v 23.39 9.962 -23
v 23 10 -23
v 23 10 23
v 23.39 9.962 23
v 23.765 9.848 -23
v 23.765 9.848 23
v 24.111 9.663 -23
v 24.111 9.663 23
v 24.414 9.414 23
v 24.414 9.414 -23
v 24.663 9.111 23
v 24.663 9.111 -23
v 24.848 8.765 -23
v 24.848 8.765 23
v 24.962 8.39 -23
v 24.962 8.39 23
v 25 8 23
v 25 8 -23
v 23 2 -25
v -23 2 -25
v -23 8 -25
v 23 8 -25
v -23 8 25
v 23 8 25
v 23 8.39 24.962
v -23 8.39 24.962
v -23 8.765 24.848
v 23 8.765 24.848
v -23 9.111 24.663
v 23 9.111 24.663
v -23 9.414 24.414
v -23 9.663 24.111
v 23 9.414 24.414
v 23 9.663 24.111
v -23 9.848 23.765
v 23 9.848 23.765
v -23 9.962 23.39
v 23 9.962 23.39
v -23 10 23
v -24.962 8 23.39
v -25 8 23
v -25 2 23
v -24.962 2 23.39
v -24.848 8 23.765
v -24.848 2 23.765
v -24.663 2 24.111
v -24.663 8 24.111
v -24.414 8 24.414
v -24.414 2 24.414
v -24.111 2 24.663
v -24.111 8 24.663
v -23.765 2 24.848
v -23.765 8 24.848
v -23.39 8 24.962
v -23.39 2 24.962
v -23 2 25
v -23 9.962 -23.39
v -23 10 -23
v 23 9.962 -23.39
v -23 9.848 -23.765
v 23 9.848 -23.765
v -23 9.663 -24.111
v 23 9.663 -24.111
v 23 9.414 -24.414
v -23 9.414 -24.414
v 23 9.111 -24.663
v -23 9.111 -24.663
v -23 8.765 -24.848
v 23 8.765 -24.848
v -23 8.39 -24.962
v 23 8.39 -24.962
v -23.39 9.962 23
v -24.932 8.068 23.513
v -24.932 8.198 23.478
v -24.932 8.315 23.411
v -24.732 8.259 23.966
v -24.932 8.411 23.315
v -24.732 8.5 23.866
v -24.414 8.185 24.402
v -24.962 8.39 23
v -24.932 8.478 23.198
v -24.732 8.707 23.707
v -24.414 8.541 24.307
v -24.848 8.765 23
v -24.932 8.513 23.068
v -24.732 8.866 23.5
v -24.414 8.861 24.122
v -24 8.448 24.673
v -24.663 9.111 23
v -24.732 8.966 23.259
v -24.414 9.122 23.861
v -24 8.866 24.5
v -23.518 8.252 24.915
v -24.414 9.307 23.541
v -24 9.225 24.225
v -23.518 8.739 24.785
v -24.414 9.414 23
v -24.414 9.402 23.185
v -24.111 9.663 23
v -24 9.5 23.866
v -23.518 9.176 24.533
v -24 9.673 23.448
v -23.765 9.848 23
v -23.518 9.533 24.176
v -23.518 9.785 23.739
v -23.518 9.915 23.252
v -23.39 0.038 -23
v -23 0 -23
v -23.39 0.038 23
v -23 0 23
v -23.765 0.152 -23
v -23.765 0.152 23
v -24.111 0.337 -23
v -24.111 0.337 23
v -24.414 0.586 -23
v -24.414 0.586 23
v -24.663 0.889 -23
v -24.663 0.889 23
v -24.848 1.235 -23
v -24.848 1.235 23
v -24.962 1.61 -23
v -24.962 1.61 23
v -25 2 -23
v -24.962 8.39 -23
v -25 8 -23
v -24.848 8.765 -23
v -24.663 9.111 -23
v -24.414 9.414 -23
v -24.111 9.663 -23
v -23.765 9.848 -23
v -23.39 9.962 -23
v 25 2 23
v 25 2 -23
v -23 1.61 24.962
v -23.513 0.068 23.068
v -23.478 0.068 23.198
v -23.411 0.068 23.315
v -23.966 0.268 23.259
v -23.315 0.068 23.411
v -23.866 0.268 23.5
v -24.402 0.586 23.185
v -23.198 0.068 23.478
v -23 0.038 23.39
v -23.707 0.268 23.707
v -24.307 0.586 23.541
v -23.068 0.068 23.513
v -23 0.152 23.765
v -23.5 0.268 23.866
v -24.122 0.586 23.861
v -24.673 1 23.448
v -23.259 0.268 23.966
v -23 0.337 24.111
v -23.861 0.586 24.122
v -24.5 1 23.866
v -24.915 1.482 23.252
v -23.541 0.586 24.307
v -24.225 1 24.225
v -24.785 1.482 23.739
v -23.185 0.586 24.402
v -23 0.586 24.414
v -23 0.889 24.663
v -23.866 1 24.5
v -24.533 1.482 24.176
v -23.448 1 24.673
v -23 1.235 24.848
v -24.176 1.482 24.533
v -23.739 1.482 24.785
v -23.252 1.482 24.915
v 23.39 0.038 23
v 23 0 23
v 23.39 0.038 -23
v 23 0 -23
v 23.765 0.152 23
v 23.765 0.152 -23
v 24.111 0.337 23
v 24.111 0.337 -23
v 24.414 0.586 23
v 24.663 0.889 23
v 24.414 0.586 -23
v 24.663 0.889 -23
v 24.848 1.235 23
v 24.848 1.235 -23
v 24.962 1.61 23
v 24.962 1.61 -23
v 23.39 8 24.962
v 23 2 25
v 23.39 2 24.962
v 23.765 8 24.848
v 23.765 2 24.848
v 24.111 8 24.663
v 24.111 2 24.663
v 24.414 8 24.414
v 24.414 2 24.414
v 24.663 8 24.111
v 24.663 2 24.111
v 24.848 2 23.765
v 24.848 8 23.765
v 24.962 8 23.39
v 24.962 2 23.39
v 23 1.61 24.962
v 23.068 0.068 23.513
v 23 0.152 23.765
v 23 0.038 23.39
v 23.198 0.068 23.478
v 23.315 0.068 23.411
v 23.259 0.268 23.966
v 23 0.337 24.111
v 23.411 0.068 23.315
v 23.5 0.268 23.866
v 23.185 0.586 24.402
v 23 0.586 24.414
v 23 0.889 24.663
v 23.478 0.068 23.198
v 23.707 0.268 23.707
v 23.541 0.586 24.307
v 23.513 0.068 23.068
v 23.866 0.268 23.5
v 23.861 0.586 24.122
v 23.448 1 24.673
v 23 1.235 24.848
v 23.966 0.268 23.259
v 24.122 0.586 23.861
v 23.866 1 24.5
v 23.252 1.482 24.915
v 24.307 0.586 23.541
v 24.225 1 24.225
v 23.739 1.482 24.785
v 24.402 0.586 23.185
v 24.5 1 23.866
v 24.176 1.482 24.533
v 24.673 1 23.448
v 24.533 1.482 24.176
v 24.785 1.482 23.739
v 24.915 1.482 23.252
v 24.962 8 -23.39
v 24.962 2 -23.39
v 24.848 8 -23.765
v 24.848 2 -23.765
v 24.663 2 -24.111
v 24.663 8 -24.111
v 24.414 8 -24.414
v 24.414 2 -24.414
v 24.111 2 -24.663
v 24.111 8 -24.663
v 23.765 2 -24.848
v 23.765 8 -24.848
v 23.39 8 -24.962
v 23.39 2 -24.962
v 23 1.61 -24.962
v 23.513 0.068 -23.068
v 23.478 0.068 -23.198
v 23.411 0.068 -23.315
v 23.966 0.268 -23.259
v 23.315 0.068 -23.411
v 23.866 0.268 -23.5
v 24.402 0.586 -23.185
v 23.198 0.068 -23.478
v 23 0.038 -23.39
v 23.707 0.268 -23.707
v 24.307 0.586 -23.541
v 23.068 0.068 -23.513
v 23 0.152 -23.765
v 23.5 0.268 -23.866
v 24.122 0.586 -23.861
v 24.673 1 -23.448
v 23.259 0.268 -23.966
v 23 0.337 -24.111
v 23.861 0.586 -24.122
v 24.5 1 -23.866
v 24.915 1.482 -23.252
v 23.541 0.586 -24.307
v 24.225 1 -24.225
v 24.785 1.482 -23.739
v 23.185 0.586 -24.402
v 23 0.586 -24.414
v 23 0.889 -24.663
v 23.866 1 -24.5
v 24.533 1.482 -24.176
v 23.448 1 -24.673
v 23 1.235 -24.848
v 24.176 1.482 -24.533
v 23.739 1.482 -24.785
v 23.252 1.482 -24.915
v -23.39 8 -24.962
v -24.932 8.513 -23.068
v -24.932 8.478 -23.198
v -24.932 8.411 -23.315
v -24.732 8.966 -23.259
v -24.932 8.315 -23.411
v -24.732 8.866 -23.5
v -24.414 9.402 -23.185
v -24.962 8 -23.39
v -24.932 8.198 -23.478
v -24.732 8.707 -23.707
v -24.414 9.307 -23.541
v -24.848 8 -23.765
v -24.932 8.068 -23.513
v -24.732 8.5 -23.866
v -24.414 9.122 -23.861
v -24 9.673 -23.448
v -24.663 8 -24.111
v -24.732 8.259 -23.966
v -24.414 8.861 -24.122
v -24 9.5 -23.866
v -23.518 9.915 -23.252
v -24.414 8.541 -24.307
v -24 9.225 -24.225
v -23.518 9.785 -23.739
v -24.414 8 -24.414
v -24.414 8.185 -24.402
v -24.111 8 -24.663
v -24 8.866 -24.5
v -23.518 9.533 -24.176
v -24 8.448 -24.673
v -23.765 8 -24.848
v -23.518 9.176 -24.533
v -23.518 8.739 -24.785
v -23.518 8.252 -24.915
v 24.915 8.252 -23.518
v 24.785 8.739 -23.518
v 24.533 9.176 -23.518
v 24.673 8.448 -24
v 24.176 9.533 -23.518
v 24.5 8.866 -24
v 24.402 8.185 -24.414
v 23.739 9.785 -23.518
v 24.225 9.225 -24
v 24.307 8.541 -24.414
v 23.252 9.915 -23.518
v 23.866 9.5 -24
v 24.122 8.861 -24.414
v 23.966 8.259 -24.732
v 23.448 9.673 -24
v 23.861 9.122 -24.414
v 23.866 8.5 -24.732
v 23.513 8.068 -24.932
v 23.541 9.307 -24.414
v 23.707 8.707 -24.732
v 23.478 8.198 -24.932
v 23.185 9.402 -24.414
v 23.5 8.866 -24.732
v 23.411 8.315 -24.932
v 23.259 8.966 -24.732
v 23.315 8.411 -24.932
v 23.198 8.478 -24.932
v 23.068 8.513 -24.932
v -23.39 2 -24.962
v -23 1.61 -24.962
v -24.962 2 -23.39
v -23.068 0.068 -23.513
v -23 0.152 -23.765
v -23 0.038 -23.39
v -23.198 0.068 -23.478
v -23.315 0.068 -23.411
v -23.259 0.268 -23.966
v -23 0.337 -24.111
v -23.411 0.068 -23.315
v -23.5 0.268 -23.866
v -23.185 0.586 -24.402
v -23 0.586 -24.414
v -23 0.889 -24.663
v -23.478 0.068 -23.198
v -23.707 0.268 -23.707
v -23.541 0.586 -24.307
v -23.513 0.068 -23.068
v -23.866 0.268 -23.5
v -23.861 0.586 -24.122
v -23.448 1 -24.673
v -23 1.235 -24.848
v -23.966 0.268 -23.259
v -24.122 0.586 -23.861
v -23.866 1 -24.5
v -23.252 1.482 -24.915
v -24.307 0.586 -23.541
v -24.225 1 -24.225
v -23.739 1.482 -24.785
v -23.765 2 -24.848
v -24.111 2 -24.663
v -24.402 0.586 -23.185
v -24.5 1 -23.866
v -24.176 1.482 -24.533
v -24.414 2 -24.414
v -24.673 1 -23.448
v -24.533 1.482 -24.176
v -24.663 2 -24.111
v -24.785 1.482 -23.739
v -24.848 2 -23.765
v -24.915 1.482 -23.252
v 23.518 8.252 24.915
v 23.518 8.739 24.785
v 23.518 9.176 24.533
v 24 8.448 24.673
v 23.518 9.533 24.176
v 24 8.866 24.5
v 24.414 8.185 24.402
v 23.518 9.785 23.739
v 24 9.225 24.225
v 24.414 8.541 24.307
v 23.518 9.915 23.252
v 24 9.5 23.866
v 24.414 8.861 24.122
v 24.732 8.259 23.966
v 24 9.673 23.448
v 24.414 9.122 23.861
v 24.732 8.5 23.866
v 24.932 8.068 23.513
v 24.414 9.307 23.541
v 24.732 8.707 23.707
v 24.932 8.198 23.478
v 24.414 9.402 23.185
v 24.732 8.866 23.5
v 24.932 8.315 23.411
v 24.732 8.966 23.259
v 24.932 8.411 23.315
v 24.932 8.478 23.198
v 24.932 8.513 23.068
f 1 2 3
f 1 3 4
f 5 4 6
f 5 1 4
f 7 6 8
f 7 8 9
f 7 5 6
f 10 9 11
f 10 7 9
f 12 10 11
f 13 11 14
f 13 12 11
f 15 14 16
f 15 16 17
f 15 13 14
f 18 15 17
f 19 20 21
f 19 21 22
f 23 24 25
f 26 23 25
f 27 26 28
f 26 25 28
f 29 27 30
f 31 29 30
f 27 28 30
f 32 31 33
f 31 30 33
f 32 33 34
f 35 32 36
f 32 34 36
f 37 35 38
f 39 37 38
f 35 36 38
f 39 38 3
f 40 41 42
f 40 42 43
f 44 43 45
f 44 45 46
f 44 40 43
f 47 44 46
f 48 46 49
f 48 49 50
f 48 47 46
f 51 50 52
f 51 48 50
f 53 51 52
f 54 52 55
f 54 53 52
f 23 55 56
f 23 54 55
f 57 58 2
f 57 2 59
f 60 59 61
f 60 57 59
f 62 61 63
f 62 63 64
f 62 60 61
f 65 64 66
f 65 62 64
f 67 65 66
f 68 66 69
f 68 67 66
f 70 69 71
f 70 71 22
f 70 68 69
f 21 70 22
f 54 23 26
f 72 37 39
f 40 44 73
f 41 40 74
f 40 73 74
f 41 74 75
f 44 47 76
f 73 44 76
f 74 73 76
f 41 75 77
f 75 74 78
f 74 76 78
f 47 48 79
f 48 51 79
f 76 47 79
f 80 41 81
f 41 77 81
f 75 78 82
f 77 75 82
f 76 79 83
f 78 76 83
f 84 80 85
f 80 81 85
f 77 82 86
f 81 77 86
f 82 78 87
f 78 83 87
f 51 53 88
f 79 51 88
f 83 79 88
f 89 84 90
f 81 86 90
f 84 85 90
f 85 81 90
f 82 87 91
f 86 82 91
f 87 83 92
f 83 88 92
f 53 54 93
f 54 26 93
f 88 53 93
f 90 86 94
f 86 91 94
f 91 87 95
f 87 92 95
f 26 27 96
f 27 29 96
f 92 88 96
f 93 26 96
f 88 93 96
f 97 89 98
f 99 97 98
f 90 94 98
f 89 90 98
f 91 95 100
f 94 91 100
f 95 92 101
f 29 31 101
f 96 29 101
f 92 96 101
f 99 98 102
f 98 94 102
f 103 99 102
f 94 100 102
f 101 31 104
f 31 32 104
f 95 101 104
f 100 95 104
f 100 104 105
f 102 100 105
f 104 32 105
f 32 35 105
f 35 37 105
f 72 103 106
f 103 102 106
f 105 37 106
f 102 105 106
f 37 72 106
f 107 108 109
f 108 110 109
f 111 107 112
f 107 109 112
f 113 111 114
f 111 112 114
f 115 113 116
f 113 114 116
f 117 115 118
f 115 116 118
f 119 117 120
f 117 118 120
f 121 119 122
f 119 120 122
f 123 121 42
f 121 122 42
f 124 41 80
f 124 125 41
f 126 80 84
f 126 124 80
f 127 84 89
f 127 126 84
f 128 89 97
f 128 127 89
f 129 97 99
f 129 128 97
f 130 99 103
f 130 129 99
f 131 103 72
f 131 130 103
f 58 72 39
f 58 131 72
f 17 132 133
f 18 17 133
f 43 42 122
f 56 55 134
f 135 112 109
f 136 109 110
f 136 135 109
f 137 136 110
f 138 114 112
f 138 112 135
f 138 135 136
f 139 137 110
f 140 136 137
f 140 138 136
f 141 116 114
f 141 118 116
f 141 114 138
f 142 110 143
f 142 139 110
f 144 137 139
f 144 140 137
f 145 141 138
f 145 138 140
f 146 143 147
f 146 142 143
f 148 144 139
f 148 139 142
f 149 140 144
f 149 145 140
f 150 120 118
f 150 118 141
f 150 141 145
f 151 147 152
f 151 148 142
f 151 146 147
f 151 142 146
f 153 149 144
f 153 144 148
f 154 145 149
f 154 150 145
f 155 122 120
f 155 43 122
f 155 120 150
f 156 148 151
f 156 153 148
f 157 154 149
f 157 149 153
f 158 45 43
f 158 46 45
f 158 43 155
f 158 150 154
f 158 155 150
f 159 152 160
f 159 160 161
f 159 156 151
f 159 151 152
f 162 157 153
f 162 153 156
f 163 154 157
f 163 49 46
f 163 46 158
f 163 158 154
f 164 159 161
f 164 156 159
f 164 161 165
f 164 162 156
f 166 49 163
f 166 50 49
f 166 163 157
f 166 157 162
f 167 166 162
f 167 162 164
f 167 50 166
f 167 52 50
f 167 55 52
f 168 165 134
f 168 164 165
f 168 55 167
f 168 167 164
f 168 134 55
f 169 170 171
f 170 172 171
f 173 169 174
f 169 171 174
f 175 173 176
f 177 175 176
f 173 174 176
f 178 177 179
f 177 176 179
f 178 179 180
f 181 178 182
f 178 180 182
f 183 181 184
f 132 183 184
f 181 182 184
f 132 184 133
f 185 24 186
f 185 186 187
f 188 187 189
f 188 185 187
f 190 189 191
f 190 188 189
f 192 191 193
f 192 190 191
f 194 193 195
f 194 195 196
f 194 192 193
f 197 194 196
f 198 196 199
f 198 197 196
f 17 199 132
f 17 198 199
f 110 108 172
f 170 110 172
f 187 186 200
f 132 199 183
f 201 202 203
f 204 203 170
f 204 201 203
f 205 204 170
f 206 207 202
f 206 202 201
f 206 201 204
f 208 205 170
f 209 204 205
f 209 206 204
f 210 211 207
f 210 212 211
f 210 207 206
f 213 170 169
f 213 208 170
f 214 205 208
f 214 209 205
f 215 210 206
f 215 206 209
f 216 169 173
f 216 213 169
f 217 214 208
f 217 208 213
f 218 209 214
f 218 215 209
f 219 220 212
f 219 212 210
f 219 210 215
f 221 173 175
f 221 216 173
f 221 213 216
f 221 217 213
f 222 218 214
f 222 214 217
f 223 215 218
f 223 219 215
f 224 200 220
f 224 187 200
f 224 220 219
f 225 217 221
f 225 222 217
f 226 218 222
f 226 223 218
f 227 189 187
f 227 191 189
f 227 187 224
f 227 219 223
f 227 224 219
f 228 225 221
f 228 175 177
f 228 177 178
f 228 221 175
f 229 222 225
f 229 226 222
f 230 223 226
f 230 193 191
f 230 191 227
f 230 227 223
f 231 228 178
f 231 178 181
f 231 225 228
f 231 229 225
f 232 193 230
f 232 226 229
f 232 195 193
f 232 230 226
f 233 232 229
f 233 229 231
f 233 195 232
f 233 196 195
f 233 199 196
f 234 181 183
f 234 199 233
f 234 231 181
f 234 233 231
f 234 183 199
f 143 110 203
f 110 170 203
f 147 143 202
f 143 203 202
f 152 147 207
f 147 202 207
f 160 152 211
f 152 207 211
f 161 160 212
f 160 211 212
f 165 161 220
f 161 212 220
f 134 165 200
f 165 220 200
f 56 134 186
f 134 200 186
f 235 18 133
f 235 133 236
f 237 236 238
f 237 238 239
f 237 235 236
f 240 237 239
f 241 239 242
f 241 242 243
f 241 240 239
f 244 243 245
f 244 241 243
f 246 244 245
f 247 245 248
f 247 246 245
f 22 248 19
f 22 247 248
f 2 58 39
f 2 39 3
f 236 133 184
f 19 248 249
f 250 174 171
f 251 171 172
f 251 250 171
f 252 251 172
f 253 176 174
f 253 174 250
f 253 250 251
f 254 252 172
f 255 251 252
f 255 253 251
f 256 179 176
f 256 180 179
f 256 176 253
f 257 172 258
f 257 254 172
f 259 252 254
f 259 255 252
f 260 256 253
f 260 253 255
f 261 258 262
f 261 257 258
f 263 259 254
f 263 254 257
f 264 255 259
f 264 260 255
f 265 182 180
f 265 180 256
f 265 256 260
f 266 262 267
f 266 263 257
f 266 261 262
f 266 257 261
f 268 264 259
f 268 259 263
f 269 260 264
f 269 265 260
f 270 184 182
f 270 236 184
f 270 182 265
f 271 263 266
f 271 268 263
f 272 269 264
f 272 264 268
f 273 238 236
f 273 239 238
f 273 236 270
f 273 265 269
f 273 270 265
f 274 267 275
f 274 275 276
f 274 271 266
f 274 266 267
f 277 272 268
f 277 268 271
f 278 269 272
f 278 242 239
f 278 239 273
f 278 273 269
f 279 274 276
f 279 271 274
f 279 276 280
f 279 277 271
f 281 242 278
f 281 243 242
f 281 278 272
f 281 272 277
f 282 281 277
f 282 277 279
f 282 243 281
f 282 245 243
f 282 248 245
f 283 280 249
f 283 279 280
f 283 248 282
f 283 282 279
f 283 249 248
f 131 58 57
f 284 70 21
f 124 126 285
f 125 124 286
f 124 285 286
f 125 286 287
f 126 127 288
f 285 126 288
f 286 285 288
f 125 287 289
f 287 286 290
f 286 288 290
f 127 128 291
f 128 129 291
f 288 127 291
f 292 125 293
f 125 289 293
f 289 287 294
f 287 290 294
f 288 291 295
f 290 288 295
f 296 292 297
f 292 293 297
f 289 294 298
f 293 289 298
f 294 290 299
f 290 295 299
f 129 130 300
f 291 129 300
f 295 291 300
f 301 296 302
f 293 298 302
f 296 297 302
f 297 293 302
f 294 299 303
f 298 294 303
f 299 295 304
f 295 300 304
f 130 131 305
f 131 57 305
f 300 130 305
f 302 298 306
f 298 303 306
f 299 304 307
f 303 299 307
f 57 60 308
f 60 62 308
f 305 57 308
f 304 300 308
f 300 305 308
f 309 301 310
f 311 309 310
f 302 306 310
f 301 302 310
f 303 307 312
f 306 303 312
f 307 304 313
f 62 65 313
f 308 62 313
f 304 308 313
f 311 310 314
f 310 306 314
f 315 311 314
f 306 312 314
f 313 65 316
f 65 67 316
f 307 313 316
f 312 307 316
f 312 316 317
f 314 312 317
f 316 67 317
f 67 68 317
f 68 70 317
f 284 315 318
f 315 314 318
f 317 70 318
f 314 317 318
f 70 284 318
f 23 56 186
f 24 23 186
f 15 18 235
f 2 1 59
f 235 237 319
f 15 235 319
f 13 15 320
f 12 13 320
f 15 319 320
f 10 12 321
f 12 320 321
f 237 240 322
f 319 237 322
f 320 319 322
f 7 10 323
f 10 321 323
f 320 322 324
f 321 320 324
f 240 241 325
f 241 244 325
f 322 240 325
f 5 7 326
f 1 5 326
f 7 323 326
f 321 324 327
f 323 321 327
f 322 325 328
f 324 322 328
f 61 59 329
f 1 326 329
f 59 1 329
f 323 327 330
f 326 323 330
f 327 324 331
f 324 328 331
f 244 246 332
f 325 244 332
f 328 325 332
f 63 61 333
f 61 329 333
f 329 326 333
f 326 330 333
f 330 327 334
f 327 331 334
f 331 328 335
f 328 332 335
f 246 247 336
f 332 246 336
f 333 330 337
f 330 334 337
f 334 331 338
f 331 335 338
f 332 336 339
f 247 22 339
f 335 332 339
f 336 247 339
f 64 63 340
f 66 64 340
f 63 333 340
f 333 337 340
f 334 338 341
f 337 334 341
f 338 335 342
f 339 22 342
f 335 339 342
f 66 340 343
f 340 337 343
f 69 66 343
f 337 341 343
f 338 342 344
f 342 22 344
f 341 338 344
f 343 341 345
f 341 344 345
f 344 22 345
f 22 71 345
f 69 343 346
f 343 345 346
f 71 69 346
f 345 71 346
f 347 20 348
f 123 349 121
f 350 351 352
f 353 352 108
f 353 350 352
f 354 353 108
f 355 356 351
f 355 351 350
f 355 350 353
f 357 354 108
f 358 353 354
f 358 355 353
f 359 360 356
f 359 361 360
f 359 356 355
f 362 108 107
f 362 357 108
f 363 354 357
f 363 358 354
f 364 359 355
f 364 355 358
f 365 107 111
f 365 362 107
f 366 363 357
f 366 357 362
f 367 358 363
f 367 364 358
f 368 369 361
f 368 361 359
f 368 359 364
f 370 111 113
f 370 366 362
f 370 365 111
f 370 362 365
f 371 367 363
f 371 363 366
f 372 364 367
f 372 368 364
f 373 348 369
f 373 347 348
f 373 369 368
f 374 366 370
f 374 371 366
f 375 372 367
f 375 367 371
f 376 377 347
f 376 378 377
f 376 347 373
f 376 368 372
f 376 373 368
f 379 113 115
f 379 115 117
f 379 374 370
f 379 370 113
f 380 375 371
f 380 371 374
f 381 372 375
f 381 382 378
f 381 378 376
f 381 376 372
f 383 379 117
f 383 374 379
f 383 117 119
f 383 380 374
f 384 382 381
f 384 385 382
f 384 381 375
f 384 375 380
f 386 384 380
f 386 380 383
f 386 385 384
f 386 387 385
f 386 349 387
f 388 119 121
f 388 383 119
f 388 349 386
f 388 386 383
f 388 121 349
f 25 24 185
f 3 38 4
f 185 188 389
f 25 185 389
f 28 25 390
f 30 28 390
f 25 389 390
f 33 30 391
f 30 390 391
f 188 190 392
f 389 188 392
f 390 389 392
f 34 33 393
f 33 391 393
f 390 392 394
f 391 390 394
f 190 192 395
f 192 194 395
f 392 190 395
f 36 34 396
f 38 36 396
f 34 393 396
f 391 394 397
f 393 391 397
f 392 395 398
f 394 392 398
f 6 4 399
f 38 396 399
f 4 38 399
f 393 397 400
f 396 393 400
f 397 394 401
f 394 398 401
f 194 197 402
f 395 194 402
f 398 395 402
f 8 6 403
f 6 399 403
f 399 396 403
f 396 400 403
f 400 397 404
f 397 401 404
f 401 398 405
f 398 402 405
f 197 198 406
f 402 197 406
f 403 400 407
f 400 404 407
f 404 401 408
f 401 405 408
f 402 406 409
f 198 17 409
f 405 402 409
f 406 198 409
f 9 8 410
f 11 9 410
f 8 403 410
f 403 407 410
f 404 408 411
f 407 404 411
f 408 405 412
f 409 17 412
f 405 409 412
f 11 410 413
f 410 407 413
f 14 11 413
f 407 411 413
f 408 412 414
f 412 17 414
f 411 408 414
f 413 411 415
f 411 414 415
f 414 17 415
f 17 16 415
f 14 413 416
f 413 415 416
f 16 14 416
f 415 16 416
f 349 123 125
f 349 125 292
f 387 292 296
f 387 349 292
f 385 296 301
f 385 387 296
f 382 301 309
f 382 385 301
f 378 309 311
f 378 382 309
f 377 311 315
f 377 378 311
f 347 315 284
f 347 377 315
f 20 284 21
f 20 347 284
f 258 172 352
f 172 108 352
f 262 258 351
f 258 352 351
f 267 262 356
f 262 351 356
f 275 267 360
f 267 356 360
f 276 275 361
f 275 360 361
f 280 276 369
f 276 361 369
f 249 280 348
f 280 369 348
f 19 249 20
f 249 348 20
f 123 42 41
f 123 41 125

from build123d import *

# Parameters (mm, degrees)
SKETCH1_W           = 50
SKETCH1_H           = 50
BOSS_EXTRUDE1_DEPTH = 10
FILLET1_R           = 2
FILLET2_R           = 2
FILLET3_R           = 2
FILLET4_R           = 2
FILLET5_R           = 2


with BuildPart() as part:
    # Sketch1 → Boss-Extrude1 (new body)
    with BuildSketch(Plane(origin=(0, 0, 0), x_dir=(1, 0, 0), z_dir=(0, 1, 0))):
        Rectangle(SKETCH1_W, SKETCH1_H)
    extrude(amount=BOSS_EXTRUDE1_DEPTH)

    # Fillet1
    fillet1_edges = [part.edges().sort_by_distance(p)[0] for p in [
        (0, 10, 25),
    ]]
    fillet(fillet1_edges, radius=FILLET1_R)

    # Fillet2
    fillet2_edges = [part.edges().sort_by_distance(p)[0] for p in [
        (25, 10, -1),
        (25, 4, 25),
        (25, 9.414213562, 24.414213562),
    ]]
    fillet(fillet2_edges, radius=FILLET2_R)

    # Fillet3
    fillet3_edges = [part.edges().sort_by_distance(p)[0] for p in [
        (25, 4, -25),
        (-1, 10, -25),
        (24.414213562, 9.414213562, -25),
    ]]
    fillet(fillet3_edges, radius=FILLET3_R)

    # Fillet4
    fillet4_edges = [part.edges().sort_by_distance(p)[0] for p in [
        (-25, 4, 25),
        (-25, 9.414213562, 24.414213562),
        (-25, 4, -25),
        (-25, 10, 0),
        (-25, 9.414213562, -24.414213562),
    ]]
    fillet(fillet4_edges, radius=FILLET4_R)

    # Fillet5
    fillet5_edges = [part.edges().sort_by_distance(p)[0] for p in [
        (25, 0, 0),
        (24.414213562, 0, 24.414213562),
        (0, 0, -25),
        (24.414213562, 0, -24.414213562),
        (-25, 0, 0),
        (0, 0, 25),
        (-24.414213562, 0, 24.414213562),
        (-24.414213562, 0, -24.414213562),
    ]]
    fillet(fillet5_edges, radius=FILLET5_R)


solid = part.part
